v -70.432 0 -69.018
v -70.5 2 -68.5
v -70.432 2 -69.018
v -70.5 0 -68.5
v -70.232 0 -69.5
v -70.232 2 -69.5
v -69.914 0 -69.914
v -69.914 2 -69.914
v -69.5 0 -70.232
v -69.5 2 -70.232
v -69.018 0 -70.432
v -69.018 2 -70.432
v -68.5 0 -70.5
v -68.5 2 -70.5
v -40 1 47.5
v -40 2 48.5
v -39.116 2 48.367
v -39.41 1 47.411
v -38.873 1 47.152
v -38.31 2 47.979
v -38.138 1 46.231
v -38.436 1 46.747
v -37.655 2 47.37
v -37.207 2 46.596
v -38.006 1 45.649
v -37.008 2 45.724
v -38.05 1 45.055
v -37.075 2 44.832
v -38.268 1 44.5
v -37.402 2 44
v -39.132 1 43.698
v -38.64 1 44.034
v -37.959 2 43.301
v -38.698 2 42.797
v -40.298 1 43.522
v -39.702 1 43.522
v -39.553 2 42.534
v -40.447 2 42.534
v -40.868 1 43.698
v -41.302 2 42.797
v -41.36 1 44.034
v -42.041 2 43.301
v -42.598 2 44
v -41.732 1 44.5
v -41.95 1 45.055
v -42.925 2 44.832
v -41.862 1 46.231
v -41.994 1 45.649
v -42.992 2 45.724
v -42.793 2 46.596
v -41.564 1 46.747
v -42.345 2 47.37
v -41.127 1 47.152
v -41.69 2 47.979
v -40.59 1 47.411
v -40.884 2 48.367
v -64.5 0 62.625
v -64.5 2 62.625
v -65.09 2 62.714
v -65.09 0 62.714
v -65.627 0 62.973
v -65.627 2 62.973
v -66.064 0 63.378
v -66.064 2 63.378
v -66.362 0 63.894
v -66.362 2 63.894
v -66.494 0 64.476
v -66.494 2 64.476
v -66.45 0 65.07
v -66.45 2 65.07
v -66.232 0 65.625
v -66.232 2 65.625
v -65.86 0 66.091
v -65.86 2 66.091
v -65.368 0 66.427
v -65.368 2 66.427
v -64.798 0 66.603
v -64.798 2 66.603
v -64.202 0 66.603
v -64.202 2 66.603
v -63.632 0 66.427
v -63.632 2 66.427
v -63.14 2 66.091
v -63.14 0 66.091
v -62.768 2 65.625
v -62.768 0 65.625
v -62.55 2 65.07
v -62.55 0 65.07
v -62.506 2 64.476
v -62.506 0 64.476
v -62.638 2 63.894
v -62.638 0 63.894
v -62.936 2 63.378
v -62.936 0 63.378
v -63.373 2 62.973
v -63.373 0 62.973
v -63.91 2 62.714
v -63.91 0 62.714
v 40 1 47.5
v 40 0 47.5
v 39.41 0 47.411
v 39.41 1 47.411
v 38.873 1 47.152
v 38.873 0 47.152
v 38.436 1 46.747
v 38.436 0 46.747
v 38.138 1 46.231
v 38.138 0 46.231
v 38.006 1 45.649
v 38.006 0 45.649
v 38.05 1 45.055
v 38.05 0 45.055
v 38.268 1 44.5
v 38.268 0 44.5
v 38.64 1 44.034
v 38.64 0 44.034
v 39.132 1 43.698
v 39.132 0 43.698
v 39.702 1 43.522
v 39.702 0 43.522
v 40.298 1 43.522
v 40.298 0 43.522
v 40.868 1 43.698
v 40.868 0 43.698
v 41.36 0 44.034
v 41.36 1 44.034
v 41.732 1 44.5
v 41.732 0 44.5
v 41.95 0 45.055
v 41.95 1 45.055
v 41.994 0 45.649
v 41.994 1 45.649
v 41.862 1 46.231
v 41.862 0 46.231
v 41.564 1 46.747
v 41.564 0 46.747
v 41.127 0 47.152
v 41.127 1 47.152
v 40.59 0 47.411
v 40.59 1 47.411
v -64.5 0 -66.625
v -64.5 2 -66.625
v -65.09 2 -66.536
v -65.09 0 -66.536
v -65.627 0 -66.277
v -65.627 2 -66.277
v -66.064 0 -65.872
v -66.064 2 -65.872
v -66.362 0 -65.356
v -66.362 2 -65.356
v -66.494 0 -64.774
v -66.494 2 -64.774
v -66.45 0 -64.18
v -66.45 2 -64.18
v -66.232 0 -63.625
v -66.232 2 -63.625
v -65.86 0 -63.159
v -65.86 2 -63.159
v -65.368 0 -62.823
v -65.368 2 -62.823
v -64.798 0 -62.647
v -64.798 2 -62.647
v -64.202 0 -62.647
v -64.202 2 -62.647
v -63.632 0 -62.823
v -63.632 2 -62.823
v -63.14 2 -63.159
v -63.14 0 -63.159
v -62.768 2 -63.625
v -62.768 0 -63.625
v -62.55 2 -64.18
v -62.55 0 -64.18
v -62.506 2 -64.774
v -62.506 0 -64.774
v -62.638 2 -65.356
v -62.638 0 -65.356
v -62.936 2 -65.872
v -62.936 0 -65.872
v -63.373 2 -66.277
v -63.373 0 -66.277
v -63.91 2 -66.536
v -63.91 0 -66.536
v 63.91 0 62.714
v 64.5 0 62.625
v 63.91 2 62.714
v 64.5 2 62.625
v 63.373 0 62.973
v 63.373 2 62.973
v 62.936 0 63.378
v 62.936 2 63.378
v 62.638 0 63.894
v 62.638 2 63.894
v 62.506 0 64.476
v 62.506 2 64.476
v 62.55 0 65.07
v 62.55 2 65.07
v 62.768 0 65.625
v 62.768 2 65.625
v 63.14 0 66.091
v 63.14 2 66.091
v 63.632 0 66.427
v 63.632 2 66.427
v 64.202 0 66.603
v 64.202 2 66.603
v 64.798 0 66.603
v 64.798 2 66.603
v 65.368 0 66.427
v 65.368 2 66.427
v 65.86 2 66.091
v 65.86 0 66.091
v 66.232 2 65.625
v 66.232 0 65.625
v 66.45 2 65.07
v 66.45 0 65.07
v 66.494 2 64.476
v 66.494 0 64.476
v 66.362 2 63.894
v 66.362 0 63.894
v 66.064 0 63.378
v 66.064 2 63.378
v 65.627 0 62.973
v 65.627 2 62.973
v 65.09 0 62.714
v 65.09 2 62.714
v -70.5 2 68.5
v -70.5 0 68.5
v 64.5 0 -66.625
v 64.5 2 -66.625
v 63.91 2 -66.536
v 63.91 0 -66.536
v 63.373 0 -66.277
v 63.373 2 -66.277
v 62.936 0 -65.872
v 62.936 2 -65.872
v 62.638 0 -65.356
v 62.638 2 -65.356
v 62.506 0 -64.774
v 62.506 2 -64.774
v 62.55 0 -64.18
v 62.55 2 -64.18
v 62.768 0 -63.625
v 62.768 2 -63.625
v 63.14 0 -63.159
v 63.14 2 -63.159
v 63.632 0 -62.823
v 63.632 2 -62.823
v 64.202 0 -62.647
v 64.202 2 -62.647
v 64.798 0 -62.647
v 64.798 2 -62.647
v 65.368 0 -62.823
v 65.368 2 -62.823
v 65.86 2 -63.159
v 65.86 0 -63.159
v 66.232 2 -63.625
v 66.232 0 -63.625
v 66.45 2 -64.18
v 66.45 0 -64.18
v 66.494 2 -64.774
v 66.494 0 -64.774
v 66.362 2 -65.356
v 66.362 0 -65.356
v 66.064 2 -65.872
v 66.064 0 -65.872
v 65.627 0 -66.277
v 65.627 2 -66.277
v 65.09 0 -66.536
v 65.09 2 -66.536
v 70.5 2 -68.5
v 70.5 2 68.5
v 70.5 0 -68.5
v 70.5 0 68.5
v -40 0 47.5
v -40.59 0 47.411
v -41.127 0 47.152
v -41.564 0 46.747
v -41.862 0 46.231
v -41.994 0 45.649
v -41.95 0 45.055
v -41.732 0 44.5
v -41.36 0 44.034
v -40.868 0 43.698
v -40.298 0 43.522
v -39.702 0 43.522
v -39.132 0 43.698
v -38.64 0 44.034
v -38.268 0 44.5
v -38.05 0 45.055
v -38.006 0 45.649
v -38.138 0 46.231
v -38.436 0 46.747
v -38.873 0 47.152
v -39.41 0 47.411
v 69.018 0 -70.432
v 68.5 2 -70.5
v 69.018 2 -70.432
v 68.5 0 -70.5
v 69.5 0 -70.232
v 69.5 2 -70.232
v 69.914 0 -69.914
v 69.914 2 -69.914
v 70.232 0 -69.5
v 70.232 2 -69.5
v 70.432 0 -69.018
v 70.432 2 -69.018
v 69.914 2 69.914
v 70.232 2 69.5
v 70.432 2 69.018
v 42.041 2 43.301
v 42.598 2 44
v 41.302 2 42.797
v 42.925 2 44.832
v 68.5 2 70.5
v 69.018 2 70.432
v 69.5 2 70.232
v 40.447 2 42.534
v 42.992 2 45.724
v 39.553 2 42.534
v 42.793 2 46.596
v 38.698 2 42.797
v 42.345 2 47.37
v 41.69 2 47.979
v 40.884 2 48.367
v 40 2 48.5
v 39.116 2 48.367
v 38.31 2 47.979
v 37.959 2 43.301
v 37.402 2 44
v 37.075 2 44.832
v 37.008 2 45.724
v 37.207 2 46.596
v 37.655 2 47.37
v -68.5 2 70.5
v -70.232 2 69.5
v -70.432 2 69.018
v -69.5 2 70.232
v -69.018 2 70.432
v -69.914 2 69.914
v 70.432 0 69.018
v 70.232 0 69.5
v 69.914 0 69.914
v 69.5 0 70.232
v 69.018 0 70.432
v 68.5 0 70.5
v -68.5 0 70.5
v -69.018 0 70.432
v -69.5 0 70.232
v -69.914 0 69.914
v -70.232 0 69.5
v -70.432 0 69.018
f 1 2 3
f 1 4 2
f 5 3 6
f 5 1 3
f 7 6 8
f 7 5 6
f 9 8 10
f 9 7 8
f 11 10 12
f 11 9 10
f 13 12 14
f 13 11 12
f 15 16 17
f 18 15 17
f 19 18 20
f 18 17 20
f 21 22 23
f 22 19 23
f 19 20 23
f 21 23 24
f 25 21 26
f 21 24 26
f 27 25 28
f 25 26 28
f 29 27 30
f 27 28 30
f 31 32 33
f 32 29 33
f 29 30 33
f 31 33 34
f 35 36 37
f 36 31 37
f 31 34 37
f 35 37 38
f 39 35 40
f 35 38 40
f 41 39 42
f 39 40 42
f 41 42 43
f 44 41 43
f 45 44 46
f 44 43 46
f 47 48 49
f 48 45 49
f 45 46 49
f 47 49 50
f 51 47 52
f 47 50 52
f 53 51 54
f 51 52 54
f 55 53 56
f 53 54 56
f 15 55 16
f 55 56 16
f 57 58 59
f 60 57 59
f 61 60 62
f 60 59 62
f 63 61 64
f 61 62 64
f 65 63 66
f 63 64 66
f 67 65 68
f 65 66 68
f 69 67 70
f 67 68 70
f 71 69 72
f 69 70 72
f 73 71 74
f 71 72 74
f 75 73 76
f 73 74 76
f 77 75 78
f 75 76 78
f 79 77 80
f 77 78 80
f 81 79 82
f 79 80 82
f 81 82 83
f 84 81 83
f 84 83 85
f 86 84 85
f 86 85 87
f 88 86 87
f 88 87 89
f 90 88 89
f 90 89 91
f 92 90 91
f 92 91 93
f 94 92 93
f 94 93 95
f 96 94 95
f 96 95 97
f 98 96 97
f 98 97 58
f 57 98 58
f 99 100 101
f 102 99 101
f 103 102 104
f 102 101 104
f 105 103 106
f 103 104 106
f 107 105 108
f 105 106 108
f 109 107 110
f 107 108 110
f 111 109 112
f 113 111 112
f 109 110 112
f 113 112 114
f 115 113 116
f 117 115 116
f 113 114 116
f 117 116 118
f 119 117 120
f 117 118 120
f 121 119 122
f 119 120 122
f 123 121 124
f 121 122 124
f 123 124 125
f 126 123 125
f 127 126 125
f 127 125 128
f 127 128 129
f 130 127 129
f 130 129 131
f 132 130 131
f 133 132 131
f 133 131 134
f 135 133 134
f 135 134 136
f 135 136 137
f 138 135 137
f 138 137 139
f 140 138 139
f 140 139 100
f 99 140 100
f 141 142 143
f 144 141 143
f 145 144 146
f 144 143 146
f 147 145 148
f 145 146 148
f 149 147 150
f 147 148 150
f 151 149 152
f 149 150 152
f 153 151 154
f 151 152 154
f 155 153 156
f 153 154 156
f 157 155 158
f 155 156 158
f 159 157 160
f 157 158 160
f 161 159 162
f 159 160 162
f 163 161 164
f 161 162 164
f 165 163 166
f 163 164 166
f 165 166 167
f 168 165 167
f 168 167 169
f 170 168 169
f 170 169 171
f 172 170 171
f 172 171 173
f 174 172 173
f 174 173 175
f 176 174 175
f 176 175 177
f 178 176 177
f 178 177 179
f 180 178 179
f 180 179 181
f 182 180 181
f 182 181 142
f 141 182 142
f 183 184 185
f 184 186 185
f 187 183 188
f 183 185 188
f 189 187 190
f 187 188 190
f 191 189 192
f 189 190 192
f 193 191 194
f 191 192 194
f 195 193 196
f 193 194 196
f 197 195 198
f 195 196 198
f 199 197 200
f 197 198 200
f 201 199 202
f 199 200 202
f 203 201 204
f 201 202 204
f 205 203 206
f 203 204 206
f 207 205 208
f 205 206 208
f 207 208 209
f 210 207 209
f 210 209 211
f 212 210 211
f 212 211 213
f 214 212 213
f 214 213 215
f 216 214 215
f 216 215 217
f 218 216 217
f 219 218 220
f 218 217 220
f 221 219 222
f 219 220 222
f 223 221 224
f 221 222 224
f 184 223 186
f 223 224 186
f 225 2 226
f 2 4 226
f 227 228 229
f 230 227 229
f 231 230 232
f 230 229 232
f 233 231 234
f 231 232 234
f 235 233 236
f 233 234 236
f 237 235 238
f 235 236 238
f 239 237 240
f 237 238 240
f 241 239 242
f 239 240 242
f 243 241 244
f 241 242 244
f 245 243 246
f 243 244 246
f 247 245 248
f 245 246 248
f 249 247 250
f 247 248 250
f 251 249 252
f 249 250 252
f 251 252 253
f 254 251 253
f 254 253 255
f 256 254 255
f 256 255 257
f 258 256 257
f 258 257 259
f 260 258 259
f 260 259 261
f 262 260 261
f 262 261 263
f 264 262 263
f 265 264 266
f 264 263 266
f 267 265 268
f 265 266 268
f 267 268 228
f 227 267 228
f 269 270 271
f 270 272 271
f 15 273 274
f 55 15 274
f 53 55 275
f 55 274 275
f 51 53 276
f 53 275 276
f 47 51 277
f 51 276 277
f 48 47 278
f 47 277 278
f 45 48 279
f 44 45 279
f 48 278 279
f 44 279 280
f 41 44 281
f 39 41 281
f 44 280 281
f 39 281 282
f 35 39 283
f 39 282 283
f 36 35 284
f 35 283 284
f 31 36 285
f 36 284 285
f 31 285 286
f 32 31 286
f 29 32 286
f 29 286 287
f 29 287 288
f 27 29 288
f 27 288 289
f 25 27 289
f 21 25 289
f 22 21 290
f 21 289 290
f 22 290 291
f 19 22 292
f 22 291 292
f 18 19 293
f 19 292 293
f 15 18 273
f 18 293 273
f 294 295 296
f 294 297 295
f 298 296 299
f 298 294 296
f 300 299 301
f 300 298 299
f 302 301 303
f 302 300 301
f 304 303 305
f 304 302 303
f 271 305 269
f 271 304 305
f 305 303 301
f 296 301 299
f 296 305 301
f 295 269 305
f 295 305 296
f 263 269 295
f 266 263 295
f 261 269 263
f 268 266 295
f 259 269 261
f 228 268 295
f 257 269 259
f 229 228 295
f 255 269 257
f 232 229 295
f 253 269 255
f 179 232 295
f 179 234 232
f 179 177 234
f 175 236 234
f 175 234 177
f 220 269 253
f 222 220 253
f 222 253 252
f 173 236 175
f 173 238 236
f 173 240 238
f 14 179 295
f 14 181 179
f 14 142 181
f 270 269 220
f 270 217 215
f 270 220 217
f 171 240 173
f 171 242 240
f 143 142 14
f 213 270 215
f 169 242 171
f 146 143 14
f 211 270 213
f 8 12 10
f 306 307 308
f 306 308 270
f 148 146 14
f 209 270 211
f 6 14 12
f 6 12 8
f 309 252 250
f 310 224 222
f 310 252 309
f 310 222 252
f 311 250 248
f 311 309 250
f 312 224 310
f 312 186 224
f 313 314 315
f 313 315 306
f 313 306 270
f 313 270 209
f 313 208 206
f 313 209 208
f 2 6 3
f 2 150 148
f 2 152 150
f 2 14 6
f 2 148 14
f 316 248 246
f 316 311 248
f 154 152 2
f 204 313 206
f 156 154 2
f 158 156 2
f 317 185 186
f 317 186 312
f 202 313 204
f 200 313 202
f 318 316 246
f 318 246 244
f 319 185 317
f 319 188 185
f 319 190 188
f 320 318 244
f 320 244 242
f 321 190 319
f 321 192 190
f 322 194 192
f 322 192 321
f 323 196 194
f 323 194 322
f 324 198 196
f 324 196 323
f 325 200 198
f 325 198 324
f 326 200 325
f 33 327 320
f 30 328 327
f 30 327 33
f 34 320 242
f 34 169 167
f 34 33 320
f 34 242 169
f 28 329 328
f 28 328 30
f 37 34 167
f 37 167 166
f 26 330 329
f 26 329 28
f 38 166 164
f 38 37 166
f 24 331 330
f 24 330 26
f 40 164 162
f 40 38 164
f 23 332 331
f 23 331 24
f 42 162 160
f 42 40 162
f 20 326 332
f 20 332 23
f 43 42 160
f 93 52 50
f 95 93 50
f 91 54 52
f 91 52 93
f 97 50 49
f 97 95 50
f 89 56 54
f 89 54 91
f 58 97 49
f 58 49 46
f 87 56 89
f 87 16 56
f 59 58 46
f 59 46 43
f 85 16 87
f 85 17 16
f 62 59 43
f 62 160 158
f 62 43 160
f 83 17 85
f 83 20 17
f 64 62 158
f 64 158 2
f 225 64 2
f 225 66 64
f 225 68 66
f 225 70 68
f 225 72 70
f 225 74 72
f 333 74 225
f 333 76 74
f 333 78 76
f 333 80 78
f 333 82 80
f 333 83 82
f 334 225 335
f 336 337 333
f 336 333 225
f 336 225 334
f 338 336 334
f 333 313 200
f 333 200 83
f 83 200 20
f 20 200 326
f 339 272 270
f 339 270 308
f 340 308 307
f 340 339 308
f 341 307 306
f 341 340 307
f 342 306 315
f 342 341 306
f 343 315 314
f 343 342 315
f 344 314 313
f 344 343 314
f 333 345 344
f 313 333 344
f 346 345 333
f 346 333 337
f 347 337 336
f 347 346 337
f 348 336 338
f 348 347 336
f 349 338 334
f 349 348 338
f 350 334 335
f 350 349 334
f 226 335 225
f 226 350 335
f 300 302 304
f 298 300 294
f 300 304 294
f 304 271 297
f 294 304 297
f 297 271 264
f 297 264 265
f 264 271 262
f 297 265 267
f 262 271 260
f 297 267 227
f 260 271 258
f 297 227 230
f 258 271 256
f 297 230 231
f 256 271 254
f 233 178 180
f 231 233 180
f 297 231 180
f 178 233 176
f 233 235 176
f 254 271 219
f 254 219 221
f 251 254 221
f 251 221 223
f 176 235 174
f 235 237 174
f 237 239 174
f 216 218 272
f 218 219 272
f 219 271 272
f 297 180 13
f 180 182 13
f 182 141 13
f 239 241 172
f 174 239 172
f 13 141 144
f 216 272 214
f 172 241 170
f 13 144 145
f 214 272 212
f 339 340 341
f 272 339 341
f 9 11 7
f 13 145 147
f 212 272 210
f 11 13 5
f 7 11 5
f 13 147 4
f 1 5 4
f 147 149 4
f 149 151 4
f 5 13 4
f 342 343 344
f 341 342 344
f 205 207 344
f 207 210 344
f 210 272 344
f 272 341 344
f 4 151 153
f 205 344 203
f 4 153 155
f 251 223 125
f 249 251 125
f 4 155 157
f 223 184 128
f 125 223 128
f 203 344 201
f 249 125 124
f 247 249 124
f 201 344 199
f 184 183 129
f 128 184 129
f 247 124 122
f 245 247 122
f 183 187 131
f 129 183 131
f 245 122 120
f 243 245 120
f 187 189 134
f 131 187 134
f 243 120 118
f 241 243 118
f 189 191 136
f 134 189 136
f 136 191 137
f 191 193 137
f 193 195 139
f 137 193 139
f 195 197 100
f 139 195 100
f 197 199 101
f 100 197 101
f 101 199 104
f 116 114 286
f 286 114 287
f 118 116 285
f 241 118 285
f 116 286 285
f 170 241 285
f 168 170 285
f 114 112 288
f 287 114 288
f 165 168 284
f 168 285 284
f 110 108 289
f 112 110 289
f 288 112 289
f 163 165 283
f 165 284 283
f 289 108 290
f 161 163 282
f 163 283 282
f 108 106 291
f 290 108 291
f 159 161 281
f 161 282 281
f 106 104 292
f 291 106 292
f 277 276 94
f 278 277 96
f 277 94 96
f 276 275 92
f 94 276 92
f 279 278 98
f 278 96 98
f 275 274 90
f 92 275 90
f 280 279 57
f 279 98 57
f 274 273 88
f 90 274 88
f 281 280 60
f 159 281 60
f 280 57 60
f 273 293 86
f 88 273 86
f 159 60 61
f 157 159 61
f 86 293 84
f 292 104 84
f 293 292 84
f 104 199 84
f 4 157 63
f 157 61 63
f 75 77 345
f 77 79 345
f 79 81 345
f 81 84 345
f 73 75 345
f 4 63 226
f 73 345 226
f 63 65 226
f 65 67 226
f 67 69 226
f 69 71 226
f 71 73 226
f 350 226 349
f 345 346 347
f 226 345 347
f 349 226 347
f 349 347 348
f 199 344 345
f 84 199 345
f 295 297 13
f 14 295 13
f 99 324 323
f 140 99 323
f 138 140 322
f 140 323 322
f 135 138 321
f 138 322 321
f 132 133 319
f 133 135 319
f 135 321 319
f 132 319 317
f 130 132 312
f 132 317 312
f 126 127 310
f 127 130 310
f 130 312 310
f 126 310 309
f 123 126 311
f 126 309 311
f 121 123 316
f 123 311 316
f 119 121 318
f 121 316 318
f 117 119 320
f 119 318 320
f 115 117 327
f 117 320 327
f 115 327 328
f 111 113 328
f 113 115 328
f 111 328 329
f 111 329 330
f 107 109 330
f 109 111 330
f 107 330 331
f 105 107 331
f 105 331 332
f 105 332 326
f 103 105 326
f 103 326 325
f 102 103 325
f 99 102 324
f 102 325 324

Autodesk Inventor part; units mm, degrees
ref_plane "YZ Plane" through (0, 0, 0) normal (1, 0, 0) x (0, 1, 0)
ref_plane "XZ Plane" through (0, 0, 0) normal (0, 1, 0) x (-1, 0, 0)
ref_plane "XY Plane" through (0, 0, 0) normal (0, 0, 1) x (1, 0, 0)
sketch "Sketch1" plane through (0, 0, 0) normal (0, 1, 0) x (-1, 0, 0)
  line L0 (64.5, 64.625) -> (-64.5, 64.625) construction
  line L1 (-64.5, 64.625) -> (-64.5, -64.625) construction
  line L2 (-64.5, -64.625) -> (62.5, -64.625) construction
  line L3 (64.5, -62.625) -> (64.5, 64.625) construction
  line L4 (64.5, 64.625) -> (-64.5, -64.625) construction
  line L5 (-64.5, 64.625) -> (64.5, -64.625) construction
  line L6 (68.5, 70.5) -> (-68.5, 70.5)
  line L7 (-70.5, 68.5) -> (-70.5, -68.5)
  line L8 (-68.5, -70.5) -> (68.5, -70.5)
  line L9 (70.5, -68.5) -> (70.5, 68.5)
  line L10 (70.5, 70.5) -> (-70.5, -70.5) construction
  line L11 (-70.5, 70.5) -> (70.5, -70.5) construction
  arc A0 (62.5, -64.625) -> (64.5, -62.625) centre (62.5, -62.625) ccw
  arc A1 (70.5, 68.5) -> (68.5, 70.5) centre (68.5, 68.5) ccw
  arc A2 (68.5, -70.5) -> (70.5, -68.5) centre (68.5, -68.5) ccw
  arc A3 (-70.5, -68.5) -> (-68.5, -70.5) centre (-68.5, -68.5) ccw
  arc A4 (-68.5, 70.5) -> (-70.5, 68.5) centre (-68.5, 68.5) ccw
  point P0 (0, 0)
  dimension "d0" = 129
  dimension "d1" = 129.25
  dimension "d2" = 141
  dimension "d3" = 141
  dimension "d4" = 2
extrude "Extrusion1" add sketch "Sketch1" along normal blind 2
hole "Hole1" at (64.5, 0, -64.625) at (64.5, 0, 64.625) at (-64.5, 0, -64.625) at (-64.5, 0, 64.625) direction (0, 1, 0) diameter 4 end through all
sketch "Sketch2" plane through (0, 2, 0) normal (0, 1, 0) x (1, 0, 0)
  circle A0 centre (-64.5, 64.625) radius 2 construction
  circle A1 centre (64.5, 64.625) radius 2 construction
  circle A2 centre (64.5, -64.625) radius 2 construction
  circle A3 centre (-64.5, -64.625) radius 2 construction
  arc A4 (68.5, -70.5) -> (70.5, -68.5) centre (68.5, -68.5) ccw construction
  line L0 (70.5, -68.5) -> (70.5, 68.5) construction
  arc A5 (70.5, 68.5) -> (68.5, 70.5) centre (68.5, 68.5) ccw construction
  line L1 (68.5, 70.5) -> (-68.5, 70.5) construction
  arc A6 (-68.5, 70.5) -> (-70.5, 68.5) centre (-68.5, 68.5) ccw construction
  line L2 (-70.5, 68.5) -> (-70.5, -68.5) construction
  arc A7 (-70.5, -68.5) -> (-68.5, -70.5) centre (-68.5, -68.5) ccw construction
  line L3 (-68.5, -70.5) -> (68.5, -70.5) construction
  line L4 (70.5, -68.5) -> (70.5, 68.5) construction
  line L5 (70.5, -45.5) -> (-70.5, -45.5) construction
  line L6 (-70.5, 68.5) -> (-70.5, -68.5) construction
  line L7 (0, -45.5) -> (-40, -45.5) construction
  line L8 (-40, -45.5) -> (0, -45.5) construction
  line L9 (0, -45.5) -> (40, -45.5) construction
  point P0 (0, 0)
  dimension "d14" = 25
  dimension "d15" = 40
  dimension "d16" = 40
hole "Hole2" at (-40, 2, 45.5) at (40, 2, 45.5) direction (0, -1, 0) diameter 4 end through all countersink diameter 6 countersink angle 90
properties part number "plate_f16"
